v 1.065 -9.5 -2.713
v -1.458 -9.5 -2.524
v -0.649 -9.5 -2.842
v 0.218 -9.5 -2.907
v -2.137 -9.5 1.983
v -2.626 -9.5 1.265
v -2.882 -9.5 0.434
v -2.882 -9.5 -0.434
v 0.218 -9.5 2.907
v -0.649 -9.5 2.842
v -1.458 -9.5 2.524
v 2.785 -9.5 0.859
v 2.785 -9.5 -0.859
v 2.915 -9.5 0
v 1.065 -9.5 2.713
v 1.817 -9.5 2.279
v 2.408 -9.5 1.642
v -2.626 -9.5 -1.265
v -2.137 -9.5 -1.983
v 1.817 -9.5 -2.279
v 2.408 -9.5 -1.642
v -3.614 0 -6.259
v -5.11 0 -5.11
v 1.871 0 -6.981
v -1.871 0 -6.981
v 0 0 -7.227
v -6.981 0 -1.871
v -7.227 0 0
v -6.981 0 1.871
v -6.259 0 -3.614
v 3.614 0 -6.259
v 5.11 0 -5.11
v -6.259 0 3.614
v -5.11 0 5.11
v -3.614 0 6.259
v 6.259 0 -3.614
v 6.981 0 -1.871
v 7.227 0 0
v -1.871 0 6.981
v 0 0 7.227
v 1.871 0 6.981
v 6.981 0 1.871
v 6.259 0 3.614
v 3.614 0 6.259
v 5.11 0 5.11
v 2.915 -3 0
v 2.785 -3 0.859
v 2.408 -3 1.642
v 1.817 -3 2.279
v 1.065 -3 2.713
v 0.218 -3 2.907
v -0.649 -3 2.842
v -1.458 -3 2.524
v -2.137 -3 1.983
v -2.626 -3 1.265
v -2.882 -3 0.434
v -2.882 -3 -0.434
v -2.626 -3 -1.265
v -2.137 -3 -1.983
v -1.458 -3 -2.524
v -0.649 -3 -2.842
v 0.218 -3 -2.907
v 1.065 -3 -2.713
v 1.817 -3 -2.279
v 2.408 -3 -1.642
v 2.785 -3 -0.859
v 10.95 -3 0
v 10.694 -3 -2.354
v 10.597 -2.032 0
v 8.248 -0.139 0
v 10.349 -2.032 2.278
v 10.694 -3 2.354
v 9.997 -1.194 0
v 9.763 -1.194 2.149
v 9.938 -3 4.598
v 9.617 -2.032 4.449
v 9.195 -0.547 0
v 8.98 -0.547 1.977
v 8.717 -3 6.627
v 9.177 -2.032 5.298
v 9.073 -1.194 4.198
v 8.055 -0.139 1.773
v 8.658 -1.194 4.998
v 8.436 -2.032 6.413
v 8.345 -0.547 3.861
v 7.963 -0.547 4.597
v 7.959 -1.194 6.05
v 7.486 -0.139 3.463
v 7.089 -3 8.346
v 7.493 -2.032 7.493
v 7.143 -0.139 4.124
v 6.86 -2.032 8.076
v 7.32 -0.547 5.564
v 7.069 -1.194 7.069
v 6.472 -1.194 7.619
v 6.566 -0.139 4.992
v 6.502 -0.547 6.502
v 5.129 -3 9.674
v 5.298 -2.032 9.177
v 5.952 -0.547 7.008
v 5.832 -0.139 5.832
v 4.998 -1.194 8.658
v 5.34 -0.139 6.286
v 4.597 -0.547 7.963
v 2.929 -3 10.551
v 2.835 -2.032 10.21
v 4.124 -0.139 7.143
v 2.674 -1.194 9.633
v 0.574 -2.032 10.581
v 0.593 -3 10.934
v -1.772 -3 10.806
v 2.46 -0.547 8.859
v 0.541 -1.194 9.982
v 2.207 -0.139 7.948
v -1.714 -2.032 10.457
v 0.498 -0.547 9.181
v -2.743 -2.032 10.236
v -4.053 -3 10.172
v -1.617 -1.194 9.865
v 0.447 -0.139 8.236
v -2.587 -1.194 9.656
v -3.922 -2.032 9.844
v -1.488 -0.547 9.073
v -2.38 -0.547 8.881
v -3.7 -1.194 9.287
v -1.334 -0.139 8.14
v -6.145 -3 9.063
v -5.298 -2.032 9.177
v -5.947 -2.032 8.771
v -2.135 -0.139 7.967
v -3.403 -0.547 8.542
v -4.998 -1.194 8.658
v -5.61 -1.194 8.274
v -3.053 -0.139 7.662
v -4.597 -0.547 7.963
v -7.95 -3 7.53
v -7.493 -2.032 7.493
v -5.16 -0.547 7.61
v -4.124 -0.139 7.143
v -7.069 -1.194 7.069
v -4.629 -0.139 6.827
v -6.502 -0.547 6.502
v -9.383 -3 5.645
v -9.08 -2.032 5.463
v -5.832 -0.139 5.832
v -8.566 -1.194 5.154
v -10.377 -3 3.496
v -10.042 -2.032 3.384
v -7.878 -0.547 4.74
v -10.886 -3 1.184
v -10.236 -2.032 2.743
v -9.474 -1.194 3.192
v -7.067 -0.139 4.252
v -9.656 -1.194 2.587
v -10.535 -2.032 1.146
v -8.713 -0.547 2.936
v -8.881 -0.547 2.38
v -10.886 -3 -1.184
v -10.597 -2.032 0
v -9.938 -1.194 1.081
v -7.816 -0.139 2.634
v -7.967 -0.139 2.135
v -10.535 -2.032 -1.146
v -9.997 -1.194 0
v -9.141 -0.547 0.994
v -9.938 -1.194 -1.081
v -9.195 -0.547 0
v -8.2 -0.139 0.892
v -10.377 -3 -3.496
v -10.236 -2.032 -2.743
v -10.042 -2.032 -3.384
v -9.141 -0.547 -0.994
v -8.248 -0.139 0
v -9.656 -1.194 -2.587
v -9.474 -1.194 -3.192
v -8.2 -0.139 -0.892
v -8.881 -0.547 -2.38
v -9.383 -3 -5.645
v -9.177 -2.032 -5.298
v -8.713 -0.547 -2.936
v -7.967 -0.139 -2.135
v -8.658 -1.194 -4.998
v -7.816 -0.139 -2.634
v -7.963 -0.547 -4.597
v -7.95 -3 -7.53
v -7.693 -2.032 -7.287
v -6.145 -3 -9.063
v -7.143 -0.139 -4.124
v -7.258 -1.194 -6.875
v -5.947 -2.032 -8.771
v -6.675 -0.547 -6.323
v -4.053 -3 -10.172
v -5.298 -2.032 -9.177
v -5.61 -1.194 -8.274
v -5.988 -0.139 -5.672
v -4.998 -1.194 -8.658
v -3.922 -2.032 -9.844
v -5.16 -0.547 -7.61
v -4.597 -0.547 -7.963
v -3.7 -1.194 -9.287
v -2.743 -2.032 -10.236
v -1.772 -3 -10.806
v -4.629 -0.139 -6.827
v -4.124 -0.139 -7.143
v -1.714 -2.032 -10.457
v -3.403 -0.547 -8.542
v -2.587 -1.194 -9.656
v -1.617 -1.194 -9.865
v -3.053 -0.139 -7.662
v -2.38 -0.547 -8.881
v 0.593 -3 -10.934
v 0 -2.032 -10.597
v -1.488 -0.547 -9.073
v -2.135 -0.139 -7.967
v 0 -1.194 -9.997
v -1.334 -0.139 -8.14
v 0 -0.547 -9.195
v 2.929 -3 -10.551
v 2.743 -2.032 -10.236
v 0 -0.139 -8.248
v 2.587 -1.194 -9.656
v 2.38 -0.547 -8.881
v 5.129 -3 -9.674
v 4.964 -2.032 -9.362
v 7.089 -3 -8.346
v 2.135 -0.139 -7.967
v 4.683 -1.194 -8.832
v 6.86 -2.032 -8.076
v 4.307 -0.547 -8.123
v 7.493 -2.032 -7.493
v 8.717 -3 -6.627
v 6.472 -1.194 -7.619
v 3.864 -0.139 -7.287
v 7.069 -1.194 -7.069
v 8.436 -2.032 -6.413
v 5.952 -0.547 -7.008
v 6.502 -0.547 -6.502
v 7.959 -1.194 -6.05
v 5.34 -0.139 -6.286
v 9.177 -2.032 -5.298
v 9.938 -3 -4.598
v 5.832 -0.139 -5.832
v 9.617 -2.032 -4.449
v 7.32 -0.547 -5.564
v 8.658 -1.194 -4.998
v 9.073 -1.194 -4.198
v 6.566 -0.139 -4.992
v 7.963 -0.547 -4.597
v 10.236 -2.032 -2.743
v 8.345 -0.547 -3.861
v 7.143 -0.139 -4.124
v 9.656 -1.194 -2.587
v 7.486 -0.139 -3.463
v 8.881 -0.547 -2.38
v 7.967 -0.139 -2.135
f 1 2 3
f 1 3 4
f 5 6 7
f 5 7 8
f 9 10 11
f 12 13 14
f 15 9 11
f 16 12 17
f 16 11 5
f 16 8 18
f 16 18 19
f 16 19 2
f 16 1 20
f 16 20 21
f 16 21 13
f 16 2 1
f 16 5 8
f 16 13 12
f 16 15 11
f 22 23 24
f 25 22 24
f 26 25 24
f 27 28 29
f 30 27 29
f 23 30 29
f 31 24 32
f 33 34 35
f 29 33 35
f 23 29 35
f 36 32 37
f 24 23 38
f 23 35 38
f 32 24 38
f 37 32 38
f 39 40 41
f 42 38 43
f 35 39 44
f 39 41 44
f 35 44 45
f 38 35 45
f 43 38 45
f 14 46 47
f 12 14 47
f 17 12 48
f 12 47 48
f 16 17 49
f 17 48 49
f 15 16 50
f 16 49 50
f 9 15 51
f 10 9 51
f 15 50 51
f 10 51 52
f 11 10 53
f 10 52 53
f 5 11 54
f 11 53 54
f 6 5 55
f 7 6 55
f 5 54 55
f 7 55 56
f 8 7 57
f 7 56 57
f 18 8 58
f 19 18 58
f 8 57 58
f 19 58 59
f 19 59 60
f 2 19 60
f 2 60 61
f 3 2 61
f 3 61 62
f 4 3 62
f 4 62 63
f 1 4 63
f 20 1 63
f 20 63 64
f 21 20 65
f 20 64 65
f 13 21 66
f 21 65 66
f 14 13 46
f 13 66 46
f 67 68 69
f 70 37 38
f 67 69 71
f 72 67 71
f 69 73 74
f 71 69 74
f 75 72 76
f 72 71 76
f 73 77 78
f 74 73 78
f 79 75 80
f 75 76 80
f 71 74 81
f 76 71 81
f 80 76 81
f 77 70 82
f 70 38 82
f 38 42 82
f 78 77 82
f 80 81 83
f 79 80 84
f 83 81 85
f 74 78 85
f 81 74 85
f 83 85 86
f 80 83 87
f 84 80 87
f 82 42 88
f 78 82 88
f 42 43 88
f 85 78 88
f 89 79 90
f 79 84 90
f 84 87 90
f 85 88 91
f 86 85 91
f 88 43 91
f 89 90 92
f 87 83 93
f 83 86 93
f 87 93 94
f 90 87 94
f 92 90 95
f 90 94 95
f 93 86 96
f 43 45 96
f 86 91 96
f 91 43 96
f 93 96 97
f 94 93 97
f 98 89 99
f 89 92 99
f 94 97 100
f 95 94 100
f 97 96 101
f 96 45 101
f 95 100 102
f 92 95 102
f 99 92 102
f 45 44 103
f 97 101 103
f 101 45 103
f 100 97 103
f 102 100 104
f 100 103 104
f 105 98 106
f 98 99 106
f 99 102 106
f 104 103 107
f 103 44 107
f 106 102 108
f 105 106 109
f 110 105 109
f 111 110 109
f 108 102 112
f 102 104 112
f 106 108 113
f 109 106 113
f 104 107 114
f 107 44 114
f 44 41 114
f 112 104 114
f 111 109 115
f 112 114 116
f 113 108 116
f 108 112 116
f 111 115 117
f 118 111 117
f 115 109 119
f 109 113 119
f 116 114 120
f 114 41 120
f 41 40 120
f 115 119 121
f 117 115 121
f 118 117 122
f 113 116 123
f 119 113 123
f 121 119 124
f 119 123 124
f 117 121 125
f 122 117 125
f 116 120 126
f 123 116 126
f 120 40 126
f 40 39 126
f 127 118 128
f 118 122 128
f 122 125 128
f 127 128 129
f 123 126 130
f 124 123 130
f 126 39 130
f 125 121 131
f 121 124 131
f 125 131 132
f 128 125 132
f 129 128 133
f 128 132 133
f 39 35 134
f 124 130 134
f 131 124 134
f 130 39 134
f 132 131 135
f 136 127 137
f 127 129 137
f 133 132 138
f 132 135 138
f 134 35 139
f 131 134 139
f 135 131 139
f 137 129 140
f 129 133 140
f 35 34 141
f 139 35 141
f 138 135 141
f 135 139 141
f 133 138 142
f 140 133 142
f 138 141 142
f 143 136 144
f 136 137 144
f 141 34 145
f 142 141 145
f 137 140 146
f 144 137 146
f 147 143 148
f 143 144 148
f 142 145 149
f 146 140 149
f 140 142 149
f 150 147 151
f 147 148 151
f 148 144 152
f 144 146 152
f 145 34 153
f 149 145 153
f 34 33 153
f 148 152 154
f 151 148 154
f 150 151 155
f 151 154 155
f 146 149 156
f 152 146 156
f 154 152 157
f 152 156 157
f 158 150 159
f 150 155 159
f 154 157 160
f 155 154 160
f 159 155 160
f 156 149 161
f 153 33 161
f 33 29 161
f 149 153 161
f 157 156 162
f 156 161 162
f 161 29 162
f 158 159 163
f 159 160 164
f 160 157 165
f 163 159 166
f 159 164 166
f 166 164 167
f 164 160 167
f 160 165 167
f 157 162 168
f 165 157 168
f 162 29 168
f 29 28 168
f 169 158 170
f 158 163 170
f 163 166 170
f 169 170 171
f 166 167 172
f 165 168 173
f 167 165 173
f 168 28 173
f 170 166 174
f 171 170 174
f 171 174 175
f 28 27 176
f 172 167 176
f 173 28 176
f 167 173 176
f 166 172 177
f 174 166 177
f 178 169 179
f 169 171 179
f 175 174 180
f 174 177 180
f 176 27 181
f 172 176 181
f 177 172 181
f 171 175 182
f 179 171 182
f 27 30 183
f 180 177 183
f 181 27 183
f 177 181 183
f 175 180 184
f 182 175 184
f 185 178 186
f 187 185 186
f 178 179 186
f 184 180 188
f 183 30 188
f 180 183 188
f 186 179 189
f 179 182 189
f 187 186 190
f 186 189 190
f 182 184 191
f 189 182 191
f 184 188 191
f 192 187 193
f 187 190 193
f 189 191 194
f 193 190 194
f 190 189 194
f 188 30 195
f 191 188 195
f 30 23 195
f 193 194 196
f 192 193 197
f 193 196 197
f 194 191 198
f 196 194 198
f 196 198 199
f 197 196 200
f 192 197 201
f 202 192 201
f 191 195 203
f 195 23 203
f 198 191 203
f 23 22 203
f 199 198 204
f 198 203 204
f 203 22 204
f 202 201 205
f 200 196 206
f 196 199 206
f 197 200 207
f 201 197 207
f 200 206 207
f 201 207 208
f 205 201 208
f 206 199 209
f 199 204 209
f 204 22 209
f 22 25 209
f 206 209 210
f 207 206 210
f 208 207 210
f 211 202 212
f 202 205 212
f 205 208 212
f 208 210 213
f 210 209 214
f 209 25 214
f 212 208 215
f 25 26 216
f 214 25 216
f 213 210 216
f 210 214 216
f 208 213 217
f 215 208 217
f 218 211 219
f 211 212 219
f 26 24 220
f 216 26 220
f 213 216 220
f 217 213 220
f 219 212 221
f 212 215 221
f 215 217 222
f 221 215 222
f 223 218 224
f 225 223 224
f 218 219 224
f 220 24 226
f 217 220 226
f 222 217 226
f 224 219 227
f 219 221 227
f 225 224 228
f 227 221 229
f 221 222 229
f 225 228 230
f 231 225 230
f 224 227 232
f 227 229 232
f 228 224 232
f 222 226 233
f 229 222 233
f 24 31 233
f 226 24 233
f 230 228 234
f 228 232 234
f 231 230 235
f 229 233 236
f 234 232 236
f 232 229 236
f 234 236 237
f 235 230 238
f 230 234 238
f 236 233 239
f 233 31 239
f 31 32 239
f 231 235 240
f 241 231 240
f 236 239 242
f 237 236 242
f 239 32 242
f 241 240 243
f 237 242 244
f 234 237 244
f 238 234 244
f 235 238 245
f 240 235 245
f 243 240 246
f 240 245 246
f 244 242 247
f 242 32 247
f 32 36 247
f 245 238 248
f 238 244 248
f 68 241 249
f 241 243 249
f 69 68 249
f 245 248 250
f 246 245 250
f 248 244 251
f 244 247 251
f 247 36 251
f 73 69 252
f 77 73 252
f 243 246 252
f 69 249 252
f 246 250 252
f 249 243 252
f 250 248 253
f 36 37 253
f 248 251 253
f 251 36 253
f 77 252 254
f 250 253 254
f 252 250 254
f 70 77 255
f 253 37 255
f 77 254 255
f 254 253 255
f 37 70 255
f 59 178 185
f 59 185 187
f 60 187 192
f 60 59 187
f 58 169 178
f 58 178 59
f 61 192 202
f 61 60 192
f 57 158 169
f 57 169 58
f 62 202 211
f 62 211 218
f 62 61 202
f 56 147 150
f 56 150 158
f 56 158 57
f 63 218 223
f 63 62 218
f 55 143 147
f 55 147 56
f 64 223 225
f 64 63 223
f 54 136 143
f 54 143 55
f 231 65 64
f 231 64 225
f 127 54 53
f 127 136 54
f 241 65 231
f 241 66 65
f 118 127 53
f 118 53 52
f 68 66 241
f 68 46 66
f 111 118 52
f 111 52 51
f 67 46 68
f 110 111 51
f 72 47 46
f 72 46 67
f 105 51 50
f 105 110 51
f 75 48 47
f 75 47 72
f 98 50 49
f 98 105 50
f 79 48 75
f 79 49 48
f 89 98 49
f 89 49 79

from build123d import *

# Parameters (mm, degrees)
F0_R     = 10.95
F1_DEPTH = 3
F2_R     = 2.915
F3_DEPTH = 6.5


# Not quite as in the source:
# - a fillet or chamfer that OpenCascade refuses, or shapes differently, is made with other operations: its cross-section is extruded or revolved along the edge and cut away or added


with BuildPart() as f1:
    # F0 (on Front) → F1 (new body)
    with BuildSketch(Plane.XZ):
        Circle(F0_R)
    extrude(amount=F1_DEPTH)

    # F2 (on face) → F3 (join)
    with BuildSketch(Plane.XZ.offset(3)):
        Circle(F2_R)
    extrude(amount=F3_DEPTH)

    # F4: fillet of radius 3.81 on 1 edges, made by hand

    # F4_s1 → F4_t2 (revolve, cut)
    with BuildSketch(Plane.XY):
        with BuildLine():
            ThreePointArc((10.95, -3), (9.6177045238, -0.843335206), (7.2270979062, 0))
            Line((7.2270979062, 0), (10.95, 0))
            Line((10.95, 0), (10.95, -3))
        make_face()
    revolve(axis=Axis((0, 0, 0), (0, -1, 0)), mode=Mode.SUBTRACT)


solid = f1.part
